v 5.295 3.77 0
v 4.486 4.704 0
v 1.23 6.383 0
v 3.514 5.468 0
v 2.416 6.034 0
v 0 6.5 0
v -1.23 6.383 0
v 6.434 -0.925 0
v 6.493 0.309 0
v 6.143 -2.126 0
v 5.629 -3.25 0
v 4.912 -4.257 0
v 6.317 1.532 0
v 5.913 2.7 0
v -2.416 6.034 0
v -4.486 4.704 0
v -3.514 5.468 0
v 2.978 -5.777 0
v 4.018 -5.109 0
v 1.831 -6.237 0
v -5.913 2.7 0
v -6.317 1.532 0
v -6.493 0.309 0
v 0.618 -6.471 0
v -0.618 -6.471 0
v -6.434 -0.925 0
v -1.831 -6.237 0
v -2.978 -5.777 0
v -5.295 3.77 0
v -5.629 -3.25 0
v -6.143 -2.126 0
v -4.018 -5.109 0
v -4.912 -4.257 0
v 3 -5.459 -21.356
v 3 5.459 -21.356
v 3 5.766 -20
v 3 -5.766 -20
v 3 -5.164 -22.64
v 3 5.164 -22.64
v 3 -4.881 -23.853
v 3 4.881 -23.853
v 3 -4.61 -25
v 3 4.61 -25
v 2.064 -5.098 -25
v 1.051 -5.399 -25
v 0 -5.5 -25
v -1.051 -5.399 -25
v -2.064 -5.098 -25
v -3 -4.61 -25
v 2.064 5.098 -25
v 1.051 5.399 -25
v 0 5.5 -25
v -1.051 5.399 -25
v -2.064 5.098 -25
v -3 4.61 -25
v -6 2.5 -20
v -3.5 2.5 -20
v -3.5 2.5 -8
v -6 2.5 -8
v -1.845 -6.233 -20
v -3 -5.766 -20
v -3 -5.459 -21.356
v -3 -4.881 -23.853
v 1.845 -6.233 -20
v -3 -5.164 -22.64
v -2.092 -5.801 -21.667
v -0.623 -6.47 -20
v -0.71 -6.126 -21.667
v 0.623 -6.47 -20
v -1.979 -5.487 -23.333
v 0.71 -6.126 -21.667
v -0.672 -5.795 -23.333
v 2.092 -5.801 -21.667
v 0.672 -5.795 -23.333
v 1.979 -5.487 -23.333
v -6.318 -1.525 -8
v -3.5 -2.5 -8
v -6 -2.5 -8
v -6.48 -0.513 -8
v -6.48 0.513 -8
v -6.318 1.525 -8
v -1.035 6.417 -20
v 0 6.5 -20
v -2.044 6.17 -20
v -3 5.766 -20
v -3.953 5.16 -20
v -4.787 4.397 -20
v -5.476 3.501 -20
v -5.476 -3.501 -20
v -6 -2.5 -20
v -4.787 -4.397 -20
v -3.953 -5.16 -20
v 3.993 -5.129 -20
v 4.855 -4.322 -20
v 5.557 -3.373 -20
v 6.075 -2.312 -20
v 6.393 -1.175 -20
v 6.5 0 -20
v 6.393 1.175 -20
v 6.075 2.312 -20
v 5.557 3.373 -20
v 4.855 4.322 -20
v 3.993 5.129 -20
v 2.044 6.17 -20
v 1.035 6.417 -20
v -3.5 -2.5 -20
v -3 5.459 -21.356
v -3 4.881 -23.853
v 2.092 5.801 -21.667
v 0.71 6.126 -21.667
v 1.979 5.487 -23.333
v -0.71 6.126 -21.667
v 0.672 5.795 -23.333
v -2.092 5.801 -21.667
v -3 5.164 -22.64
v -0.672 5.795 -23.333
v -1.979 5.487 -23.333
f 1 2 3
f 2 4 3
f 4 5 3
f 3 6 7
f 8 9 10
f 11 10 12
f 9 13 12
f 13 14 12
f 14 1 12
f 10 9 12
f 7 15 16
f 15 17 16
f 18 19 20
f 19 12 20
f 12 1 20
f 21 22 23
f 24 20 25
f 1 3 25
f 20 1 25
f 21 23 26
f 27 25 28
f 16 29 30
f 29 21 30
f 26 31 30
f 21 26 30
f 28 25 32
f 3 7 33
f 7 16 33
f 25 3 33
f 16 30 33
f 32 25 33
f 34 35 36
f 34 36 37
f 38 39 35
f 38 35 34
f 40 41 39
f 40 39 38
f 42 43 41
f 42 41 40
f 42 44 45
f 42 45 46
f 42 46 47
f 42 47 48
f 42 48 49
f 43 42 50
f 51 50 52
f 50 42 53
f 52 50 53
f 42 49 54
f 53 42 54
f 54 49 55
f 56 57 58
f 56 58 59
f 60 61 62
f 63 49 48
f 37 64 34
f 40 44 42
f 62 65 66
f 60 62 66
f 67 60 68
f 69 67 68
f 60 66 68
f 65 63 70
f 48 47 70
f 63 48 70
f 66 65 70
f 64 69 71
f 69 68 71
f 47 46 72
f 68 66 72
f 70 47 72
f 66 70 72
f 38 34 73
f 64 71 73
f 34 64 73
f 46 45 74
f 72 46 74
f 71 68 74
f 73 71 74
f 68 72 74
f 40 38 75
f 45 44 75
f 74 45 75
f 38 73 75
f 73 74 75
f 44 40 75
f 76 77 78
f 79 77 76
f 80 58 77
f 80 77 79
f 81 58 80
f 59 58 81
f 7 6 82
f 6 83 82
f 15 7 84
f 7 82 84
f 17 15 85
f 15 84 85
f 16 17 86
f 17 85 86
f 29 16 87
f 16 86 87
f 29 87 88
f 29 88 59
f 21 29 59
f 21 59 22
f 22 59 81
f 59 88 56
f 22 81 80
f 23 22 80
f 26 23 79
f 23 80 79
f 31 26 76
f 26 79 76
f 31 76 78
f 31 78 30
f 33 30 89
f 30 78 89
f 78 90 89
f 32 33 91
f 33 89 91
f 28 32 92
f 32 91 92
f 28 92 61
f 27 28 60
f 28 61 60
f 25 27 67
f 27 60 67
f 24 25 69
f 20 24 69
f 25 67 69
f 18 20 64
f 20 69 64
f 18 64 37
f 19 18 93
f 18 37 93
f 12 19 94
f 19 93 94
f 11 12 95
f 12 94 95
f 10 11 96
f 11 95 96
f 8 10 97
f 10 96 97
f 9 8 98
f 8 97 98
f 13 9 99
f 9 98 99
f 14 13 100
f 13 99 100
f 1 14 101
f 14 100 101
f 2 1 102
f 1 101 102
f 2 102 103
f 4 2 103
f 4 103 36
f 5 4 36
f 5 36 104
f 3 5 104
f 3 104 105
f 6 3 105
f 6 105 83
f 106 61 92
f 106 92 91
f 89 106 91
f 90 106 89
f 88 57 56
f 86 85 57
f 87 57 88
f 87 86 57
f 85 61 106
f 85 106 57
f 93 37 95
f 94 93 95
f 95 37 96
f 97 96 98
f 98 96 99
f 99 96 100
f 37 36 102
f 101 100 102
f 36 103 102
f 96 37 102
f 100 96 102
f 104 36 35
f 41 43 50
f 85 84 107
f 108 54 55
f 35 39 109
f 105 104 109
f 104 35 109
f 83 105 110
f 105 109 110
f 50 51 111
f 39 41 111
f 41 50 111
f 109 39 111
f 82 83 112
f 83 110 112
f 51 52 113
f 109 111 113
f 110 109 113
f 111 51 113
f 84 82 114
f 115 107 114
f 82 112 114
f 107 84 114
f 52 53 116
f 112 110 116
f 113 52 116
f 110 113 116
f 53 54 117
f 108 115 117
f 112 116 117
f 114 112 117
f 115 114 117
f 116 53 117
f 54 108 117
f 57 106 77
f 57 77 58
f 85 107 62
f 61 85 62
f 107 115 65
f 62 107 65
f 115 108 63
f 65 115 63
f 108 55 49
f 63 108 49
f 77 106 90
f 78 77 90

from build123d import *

# Parameters (mm, degrees)
CUT_EXTRUDE1_DEPTH = 5
SKETCH3_W          = 6
SKETCH3_H          = 5
CUT_EXTRUDE2_DEPTH = 12


with BuildPart() as part:
    # Sketch1 → Revolve1 (revolve)
    with BuildSketch(Plane(origin=(0, 0, 0), x_dir=(0, 0, -1), z_dir=(1, 0, 0))):
        Polygon((0, 0), (0, 6.5), (20, 6.5), (25, 5.5), (25, 0), align=None)
    revolve(axis=Axis((0, 0, -25), (0, 0, 1)))

    # Sketch2 → Cut-Extrude1 (cut)
    with BuildSketch(Plane(origin=(0, 0, -25), x_dir=(-1, 0, 0), z_dir=(0, 0, -1))):
        with BuildLine():
            Line((-3, 5.766281297), (-3, -5.766281297))
            ThreePointArc((-3, -5.766281297), (-6.5, 0), (-3, 5.766281297))
        make_face()
        with BuildLine():
            Line((3, 5.766281297), (3, -5.766281297))
            ThreePointArc((3, -5.766281297), (6.5, 0), (3, 5.766281297))
        make_face()
    extrude(amount=-CUT_EXTRUDE1_DEPTH, mode=Mode.SUBTRACT)

    # Sketch3 → Cut-Extrude2 (cut)
    with BuildSketch(Plane(origin=(0, 0, -20), x_dir=(-1, 0, 0), z_dir=(0, 0, -1))):
        with Locations((6.5, 0)):
            Rectangle(SKETCH3_W, SKETCH3_H)
    extrude(amount=-CUT_EXTRUDE2_DEPTH, mode=Mode.SUBTRACT)


solid = part.part
